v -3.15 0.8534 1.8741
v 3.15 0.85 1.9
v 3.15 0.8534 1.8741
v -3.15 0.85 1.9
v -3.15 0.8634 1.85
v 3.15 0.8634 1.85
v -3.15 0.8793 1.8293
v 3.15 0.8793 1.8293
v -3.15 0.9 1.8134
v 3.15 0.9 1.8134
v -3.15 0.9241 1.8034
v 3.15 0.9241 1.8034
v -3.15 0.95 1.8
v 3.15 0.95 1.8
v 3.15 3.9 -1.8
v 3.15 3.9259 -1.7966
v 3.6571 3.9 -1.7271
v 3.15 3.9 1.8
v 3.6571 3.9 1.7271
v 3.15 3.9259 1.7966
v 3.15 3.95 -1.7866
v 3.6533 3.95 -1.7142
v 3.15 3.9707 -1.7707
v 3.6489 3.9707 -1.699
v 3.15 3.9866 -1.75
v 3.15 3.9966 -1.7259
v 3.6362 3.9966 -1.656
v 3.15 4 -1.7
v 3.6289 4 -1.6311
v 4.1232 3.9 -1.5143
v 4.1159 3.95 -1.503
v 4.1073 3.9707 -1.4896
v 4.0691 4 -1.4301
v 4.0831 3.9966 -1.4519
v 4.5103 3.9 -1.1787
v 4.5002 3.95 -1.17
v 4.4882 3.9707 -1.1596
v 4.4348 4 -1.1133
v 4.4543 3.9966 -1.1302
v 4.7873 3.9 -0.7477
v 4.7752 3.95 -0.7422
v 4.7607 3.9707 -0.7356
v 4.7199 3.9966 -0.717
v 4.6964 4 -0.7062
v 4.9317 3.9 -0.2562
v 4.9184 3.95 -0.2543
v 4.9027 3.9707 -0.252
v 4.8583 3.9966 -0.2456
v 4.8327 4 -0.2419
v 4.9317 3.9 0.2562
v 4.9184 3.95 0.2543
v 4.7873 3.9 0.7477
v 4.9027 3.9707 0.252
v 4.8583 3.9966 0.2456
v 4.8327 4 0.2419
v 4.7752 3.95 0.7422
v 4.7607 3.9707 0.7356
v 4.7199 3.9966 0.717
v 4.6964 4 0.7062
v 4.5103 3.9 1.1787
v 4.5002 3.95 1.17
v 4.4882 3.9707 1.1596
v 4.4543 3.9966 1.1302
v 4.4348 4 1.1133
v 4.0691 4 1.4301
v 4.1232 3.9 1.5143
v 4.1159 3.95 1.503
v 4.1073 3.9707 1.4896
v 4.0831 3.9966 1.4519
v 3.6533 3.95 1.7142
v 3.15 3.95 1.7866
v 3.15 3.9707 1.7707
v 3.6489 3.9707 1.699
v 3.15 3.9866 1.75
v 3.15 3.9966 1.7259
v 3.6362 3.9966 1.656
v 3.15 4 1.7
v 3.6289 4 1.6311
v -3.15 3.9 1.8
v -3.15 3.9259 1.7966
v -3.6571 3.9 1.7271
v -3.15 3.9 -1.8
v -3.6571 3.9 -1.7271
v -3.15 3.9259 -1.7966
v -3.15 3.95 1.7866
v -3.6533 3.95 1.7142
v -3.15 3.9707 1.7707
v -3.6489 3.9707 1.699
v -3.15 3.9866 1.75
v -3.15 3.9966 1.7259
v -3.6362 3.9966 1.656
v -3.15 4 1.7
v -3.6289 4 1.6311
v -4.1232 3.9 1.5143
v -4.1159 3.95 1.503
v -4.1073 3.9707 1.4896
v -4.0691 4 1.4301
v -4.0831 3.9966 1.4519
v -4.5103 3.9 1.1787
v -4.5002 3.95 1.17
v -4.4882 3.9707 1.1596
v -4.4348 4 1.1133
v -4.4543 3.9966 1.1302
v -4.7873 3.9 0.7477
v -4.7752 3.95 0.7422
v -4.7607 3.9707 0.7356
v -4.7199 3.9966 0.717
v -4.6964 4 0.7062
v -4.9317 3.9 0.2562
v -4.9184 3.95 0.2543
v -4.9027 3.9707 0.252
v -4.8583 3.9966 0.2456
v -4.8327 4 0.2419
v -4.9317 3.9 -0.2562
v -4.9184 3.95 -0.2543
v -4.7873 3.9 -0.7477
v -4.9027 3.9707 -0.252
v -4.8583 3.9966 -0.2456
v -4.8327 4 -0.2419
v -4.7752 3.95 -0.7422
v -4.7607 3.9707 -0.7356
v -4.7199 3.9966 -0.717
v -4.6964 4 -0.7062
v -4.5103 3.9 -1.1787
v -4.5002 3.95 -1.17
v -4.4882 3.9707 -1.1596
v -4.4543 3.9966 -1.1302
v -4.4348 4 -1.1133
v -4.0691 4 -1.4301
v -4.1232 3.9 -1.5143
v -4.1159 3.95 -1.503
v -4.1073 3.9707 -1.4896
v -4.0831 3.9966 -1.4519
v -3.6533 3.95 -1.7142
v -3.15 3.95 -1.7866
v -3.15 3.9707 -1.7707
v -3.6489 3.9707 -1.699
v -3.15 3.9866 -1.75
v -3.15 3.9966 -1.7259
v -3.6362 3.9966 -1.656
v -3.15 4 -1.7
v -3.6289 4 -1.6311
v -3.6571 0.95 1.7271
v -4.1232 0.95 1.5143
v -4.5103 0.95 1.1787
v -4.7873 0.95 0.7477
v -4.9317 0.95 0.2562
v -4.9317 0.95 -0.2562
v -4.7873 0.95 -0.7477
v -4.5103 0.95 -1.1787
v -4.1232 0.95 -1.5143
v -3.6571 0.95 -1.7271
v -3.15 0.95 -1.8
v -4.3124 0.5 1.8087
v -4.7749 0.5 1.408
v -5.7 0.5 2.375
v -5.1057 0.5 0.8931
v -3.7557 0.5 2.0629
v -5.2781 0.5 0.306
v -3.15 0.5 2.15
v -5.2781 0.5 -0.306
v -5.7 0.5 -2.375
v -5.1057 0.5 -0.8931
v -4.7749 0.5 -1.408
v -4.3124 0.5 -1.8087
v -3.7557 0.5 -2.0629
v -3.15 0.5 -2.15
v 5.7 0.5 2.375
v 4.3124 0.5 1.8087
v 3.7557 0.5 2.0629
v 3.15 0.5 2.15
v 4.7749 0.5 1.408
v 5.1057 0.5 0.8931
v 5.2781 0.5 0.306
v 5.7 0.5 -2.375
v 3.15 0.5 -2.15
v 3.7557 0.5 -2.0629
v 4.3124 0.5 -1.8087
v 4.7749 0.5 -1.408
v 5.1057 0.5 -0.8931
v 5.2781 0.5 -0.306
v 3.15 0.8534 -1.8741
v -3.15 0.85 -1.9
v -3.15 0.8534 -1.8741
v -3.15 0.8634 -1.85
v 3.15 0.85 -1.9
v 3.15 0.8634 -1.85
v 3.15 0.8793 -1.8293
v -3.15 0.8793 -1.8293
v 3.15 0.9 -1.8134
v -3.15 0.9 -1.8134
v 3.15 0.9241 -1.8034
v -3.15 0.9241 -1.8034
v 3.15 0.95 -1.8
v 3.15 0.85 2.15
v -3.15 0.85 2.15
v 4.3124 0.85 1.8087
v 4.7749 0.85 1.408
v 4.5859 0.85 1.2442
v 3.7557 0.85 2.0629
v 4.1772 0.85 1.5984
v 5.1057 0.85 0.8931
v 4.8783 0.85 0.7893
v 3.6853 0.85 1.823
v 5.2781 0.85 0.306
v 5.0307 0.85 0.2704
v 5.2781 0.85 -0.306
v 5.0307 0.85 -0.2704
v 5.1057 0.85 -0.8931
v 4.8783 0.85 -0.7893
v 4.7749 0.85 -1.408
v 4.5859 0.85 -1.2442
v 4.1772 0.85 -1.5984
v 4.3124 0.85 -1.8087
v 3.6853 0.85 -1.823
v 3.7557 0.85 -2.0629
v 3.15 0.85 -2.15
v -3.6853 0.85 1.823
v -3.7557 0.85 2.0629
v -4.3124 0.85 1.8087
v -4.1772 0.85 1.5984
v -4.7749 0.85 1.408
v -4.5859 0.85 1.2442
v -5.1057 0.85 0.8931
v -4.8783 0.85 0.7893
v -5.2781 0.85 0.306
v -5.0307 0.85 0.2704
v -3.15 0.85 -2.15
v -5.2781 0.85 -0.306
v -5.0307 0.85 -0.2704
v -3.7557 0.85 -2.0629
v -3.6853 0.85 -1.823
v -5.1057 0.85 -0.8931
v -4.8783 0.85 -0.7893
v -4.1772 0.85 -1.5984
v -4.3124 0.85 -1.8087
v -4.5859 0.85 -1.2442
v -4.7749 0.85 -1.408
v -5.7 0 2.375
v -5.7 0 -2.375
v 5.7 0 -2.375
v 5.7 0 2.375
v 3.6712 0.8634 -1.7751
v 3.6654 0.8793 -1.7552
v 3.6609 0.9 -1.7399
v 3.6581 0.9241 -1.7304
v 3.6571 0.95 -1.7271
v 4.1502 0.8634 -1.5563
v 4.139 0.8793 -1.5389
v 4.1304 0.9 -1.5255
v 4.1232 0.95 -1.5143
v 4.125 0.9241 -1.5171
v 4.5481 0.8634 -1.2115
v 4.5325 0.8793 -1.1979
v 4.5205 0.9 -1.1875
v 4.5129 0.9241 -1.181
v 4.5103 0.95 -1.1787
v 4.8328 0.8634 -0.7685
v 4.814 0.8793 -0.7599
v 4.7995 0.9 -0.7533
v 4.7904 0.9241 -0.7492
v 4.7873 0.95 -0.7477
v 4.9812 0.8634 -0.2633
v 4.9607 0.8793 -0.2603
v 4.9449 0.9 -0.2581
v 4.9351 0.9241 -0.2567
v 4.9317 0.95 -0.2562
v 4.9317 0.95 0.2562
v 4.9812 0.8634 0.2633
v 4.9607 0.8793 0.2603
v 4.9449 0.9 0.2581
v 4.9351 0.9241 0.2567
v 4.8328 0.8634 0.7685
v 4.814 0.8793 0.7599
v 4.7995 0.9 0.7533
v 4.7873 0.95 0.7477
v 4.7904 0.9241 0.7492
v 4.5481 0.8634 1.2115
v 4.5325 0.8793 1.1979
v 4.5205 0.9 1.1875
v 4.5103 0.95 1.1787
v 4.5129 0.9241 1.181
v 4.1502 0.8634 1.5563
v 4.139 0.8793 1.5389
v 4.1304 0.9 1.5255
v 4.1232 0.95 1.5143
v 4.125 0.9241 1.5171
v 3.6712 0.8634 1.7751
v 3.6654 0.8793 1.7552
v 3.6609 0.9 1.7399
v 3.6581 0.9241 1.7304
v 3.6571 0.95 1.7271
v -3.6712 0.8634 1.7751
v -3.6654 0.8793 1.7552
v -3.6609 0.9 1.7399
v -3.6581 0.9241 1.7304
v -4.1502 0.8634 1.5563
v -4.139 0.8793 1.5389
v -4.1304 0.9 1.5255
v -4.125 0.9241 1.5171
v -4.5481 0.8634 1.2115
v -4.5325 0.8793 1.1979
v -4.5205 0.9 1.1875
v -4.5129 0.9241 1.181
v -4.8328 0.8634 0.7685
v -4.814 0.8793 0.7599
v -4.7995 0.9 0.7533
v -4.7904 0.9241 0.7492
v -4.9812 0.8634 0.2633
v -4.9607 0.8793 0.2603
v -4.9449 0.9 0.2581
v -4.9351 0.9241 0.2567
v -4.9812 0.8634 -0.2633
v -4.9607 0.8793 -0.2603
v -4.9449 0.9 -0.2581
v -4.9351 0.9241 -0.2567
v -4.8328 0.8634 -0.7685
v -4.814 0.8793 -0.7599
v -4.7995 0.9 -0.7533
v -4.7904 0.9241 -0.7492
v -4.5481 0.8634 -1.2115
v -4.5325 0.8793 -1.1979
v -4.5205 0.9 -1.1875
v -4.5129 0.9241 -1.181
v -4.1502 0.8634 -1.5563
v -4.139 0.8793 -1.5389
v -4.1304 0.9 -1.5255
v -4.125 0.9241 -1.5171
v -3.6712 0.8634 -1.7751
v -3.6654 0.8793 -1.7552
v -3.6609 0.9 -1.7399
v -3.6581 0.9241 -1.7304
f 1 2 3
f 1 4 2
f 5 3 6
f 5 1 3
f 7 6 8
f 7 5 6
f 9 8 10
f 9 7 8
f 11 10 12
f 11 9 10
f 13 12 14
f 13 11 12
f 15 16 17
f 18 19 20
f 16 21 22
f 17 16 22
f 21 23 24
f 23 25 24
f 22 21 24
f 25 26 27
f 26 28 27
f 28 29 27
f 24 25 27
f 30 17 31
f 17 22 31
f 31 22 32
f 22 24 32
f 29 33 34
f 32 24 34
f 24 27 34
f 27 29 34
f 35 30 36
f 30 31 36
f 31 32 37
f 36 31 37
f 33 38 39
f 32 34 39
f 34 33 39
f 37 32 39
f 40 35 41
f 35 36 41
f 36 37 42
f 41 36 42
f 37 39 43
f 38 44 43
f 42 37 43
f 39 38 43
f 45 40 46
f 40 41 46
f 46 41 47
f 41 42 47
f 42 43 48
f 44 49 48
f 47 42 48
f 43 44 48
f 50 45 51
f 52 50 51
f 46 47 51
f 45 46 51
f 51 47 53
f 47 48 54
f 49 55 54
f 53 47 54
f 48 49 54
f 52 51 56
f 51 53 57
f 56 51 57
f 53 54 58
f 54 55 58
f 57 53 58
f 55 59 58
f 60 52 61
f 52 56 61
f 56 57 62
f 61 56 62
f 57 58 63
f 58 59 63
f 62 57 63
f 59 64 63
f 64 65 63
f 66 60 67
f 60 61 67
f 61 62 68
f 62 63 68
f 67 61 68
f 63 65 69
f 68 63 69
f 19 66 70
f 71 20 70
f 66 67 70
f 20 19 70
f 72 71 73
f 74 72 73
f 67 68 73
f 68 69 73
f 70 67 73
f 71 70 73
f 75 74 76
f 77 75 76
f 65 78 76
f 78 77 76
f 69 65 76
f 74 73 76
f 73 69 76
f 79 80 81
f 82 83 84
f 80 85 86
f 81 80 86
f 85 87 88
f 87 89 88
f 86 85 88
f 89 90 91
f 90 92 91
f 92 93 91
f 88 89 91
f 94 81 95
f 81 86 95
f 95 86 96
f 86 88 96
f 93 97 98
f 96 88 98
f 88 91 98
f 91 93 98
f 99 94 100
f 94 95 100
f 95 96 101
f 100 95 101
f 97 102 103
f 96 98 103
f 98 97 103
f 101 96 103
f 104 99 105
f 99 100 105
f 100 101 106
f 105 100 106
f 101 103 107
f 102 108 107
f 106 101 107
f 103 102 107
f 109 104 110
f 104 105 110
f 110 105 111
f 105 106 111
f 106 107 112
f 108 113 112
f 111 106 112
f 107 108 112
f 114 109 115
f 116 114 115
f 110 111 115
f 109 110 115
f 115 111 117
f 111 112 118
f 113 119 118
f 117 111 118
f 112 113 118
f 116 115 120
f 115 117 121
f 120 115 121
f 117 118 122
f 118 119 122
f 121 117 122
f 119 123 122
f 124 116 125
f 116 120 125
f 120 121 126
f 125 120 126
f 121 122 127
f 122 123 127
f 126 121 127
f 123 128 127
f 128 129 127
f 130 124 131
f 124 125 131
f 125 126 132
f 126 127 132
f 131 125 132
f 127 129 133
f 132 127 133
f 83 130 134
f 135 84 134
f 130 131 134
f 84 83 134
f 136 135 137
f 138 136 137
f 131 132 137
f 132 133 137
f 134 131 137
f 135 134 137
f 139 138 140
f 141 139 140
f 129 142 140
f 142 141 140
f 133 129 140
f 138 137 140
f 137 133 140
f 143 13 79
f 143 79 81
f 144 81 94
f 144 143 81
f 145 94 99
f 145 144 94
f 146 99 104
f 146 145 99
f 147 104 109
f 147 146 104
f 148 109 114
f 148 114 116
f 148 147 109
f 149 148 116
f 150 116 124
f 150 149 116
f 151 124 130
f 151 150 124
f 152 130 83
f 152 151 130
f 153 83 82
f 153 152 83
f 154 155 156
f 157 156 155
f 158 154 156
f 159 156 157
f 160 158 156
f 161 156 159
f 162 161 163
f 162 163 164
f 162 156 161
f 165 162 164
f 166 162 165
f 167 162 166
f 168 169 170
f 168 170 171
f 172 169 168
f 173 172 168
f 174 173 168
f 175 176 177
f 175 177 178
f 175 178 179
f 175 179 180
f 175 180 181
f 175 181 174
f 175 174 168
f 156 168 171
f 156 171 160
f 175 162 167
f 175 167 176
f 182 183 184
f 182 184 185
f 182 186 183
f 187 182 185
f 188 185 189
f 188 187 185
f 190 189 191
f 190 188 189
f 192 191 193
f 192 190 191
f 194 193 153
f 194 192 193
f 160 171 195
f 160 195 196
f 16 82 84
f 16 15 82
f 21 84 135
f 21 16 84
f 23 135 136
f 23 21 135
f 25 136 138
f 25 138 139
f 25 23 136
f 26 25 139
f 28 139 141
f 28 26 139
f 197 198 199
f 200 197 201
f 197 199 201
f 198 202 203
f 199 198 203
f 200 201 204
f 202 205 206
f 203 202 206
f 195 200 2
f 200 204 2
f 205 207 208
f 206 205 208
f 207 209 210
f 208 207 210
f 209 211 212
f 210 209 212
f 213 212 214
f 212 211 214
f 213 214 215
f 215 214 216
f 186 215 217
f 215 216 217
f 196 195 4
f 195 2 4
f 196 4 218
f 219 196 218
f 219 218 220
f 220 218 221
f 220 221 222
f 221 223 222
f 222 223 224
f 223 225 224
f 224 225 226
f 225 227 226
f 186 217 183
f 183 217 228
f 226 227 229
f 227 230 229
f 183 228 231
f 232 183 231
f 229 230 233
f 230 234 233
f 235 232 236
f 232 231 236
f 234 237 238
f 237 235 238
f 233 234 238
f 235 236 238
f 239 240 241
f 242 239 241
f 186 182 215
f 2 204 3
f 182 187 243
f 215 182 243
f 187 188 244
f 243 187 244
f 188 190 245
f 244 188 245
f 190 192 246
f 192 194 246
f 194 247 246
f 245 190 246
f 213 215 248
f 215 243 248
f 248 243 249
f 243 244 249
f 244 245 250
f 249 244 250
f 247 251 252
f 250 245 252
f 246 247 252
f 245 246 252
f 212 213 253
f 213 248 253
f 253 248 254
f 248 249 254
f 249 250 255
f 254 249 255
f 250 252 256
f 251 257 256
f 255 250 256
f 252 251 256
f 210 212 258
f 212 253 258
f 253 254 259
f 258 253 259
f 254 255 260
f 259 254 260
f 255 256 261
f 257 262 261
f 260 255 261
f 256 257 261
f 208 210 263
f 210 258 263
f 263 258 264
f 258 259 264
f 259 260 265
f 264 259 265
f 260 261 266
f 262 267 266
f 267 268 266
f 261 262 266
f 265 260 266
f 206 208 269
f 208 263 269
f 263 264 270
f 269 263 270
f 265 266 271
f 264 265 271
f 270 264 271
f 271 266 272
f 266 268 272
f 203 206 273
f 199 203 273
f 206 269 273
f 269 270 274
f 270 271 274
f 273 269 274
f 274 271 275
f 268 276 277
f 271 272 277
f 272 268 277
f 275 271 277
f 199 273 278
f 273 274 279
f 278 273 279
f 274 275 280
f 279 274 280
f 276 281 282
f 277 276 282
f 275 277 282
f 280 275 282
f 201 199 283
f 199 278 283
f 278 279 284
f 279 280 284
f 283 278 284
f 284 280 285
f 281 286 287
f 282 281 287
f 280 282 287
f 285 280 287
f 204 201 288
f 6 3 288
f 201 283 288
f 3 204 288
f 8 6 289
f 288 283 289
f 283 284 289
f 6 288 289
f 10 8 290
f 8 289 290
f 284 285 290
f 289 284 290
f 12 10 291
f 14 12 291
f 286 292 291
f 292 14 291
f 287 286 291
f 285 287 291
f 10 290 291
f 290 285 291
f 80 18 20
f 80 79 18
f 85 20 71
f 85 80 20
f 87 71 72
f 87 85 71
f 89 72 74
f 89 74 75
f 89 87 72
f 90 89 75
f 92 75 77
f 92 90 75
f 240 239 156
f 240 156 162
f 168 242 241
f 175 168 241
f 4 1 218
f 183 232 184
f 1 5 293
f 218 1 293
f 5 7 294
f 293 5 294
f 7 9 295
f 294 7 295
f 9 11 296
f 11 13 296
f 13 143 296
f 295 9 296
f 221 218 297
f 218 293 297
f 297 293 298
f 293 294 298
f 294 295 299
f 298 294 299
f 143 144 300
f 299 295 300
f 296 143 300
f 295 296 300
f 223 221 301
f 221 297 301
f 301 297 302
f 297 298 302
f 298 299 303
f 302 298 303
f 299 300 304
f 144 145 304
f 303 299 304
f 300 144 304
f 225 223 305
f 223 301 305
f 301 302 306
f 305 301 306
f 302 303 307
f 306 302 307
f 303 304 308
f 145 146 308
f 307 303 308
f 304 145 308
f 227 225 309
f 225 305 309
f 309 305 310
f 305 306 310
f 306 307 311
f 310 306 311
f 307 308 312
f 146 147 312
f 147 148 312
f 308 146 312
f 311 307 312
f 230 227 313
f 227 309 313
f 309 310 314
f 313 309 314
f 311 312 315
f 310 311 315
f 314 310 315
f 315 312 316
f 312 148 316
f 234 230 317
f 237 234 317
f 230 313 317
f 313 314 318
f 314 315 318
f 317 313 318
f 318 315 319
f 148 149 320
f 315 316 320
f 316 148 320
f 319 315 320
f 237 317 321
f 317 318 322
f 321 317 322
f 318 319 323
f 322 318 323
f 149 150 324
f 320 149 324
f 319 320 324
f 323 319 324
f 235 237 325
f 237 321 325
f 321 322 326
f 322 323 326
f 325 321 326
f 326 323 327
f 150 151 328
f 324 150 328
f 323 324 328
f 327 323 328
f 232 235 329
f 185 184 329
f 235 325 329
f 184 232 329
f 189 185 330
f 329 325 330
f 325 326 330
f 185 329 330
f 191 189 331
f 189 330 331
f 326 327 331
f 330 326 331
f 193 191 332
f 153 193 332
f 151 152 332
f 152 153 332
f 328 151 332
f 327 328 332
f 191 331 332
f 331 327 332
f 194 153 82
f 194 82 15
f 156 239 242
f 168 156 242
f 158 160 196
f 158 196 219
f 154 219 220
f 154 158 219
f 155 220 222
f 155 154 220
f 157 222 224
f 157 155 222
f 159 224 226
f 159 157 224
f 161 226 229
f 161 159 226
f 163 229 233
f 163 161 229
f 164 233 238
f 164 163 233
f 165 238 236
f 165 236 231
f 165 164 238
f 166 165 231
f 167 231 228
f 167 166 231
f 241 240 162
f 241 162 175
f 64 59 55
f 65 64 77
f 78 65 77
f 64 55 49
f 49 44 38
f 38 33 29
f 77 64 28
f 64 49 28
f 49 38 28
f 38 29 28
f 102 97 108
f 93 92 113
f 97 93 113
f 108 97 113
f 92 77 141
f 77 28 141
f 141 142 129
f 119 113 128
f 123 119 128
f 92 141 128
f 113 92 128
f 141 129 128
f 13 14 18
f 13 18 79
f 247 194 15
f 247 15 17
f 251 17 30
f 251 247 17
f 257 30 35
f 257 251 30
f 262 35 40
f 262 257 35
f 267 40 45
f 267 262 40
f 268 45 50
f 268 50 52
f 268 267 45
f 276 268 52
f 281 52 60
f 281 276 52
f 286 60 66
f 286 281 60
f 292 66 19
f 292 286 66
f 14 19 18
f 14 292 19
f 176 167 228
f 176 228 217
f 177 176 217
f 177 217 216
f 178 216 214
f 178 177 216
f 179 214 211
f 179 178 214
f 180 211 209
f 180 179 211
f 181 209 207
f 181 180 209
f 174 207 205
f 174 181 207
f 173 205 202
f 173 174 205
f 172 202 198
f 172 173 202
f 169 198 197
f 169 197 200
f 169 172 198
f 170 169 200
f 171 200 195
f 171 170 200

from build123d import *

# Parameters (mm, degrees)
SKETCH1_W           = 11.4
SKETCH1_H           = 4.75
BOSS_EXTRUDE1_DEPTH = 0.5
BOSS_EXTRUDE2_DEPTH = 3.5
BOSS_EXTRUDE3_DEPTH = 0.35
FILLET1_R           = 0.1


with BuildPart() as part:
    # Sketch1 → Boss-Extrude1 (new body)
    with BuildSketch(Plane(origin=(0, 0, 0), x_dir=(1, 0, 0), z_dir=(0, 1, 0))):
        Rectangle(SKETCH1_W, SKETCH1_H)
    extrude(amount=BOSS_EXTRUDE1_DEPTH)

    # Sketch2 → Boss-Extrude2 (add)
    with BuildSketch(Plane(origin=(0, 0.5, 0), x_dir=(1, 0, 0), z_dir=(0, 1, 0))):
        with BuildLine():
            Line((3.15, 1.8), (-3.15, 1.8))
            ThreePointArc((-3.15, 1.8), (-4.95, 0), (-3.15, -1.8))
            Line((-3.15, -1.8), (3.15, -1.8))
            ThreePointArc((3.15, -1.8), (4.95, 0), (3.15, 1.8))
        make_face()
    extrude(amount=BOSS_EXTRUDE2_DEPTH)

    # Sketch2<3> → Boss-Extrude3 (add)
    with BuildSketch(Plane(origin=(0, 0.5, 0), x_dir=(1, 0, 0), z_dir=(0, 1, 0))):
        with BuildLine():
            Line((-3.15, 2.15), (3.15, 2.15))
            ThreePointArc((3.15, 2.15), (5.3, 0), (3.15, -2.15))
            Line((3.15, -2.15), (-3.15, -2.15))
            ThreePointArc((-3.15, -2.15), (-5.3, 0), (-3.15, 2.15))
        make_face()
        with BuildLine():
            Line((-3.15, 1.8), (3.15, 1.8))
            ThreePointArc((3.15, 1.8), (4.95, 0), (3.15, -1.8))
            Line((3.15, -1.8), (-3.15, -1.8))
            ThreePointArc((-3.15, -1.8), (-4.95, 0), (-3.15, 1.8))
        make_face(mode=Mode.SUBTRACT)
    extrude(amount=BOSS_EXTRUDE3_DEPTH)

    # Fillet1
    fillet1_edges = [part.edges().sort_by_distance(p)[0] for p in [
        (-4.95, 0.85, 0),
        (0, 0.85, -1.8),
        (4.95, 0.85, 0),
        (-4.95, 4, 0),
        (0, 4, -1.8),
        (4.95, 4, 0),
        (0, 4, 1.8),
        (0, 0.85, 1.8),
    ]]
    fillet(fillet1_edges, radius=FILLET1_R)


solid = part.part
